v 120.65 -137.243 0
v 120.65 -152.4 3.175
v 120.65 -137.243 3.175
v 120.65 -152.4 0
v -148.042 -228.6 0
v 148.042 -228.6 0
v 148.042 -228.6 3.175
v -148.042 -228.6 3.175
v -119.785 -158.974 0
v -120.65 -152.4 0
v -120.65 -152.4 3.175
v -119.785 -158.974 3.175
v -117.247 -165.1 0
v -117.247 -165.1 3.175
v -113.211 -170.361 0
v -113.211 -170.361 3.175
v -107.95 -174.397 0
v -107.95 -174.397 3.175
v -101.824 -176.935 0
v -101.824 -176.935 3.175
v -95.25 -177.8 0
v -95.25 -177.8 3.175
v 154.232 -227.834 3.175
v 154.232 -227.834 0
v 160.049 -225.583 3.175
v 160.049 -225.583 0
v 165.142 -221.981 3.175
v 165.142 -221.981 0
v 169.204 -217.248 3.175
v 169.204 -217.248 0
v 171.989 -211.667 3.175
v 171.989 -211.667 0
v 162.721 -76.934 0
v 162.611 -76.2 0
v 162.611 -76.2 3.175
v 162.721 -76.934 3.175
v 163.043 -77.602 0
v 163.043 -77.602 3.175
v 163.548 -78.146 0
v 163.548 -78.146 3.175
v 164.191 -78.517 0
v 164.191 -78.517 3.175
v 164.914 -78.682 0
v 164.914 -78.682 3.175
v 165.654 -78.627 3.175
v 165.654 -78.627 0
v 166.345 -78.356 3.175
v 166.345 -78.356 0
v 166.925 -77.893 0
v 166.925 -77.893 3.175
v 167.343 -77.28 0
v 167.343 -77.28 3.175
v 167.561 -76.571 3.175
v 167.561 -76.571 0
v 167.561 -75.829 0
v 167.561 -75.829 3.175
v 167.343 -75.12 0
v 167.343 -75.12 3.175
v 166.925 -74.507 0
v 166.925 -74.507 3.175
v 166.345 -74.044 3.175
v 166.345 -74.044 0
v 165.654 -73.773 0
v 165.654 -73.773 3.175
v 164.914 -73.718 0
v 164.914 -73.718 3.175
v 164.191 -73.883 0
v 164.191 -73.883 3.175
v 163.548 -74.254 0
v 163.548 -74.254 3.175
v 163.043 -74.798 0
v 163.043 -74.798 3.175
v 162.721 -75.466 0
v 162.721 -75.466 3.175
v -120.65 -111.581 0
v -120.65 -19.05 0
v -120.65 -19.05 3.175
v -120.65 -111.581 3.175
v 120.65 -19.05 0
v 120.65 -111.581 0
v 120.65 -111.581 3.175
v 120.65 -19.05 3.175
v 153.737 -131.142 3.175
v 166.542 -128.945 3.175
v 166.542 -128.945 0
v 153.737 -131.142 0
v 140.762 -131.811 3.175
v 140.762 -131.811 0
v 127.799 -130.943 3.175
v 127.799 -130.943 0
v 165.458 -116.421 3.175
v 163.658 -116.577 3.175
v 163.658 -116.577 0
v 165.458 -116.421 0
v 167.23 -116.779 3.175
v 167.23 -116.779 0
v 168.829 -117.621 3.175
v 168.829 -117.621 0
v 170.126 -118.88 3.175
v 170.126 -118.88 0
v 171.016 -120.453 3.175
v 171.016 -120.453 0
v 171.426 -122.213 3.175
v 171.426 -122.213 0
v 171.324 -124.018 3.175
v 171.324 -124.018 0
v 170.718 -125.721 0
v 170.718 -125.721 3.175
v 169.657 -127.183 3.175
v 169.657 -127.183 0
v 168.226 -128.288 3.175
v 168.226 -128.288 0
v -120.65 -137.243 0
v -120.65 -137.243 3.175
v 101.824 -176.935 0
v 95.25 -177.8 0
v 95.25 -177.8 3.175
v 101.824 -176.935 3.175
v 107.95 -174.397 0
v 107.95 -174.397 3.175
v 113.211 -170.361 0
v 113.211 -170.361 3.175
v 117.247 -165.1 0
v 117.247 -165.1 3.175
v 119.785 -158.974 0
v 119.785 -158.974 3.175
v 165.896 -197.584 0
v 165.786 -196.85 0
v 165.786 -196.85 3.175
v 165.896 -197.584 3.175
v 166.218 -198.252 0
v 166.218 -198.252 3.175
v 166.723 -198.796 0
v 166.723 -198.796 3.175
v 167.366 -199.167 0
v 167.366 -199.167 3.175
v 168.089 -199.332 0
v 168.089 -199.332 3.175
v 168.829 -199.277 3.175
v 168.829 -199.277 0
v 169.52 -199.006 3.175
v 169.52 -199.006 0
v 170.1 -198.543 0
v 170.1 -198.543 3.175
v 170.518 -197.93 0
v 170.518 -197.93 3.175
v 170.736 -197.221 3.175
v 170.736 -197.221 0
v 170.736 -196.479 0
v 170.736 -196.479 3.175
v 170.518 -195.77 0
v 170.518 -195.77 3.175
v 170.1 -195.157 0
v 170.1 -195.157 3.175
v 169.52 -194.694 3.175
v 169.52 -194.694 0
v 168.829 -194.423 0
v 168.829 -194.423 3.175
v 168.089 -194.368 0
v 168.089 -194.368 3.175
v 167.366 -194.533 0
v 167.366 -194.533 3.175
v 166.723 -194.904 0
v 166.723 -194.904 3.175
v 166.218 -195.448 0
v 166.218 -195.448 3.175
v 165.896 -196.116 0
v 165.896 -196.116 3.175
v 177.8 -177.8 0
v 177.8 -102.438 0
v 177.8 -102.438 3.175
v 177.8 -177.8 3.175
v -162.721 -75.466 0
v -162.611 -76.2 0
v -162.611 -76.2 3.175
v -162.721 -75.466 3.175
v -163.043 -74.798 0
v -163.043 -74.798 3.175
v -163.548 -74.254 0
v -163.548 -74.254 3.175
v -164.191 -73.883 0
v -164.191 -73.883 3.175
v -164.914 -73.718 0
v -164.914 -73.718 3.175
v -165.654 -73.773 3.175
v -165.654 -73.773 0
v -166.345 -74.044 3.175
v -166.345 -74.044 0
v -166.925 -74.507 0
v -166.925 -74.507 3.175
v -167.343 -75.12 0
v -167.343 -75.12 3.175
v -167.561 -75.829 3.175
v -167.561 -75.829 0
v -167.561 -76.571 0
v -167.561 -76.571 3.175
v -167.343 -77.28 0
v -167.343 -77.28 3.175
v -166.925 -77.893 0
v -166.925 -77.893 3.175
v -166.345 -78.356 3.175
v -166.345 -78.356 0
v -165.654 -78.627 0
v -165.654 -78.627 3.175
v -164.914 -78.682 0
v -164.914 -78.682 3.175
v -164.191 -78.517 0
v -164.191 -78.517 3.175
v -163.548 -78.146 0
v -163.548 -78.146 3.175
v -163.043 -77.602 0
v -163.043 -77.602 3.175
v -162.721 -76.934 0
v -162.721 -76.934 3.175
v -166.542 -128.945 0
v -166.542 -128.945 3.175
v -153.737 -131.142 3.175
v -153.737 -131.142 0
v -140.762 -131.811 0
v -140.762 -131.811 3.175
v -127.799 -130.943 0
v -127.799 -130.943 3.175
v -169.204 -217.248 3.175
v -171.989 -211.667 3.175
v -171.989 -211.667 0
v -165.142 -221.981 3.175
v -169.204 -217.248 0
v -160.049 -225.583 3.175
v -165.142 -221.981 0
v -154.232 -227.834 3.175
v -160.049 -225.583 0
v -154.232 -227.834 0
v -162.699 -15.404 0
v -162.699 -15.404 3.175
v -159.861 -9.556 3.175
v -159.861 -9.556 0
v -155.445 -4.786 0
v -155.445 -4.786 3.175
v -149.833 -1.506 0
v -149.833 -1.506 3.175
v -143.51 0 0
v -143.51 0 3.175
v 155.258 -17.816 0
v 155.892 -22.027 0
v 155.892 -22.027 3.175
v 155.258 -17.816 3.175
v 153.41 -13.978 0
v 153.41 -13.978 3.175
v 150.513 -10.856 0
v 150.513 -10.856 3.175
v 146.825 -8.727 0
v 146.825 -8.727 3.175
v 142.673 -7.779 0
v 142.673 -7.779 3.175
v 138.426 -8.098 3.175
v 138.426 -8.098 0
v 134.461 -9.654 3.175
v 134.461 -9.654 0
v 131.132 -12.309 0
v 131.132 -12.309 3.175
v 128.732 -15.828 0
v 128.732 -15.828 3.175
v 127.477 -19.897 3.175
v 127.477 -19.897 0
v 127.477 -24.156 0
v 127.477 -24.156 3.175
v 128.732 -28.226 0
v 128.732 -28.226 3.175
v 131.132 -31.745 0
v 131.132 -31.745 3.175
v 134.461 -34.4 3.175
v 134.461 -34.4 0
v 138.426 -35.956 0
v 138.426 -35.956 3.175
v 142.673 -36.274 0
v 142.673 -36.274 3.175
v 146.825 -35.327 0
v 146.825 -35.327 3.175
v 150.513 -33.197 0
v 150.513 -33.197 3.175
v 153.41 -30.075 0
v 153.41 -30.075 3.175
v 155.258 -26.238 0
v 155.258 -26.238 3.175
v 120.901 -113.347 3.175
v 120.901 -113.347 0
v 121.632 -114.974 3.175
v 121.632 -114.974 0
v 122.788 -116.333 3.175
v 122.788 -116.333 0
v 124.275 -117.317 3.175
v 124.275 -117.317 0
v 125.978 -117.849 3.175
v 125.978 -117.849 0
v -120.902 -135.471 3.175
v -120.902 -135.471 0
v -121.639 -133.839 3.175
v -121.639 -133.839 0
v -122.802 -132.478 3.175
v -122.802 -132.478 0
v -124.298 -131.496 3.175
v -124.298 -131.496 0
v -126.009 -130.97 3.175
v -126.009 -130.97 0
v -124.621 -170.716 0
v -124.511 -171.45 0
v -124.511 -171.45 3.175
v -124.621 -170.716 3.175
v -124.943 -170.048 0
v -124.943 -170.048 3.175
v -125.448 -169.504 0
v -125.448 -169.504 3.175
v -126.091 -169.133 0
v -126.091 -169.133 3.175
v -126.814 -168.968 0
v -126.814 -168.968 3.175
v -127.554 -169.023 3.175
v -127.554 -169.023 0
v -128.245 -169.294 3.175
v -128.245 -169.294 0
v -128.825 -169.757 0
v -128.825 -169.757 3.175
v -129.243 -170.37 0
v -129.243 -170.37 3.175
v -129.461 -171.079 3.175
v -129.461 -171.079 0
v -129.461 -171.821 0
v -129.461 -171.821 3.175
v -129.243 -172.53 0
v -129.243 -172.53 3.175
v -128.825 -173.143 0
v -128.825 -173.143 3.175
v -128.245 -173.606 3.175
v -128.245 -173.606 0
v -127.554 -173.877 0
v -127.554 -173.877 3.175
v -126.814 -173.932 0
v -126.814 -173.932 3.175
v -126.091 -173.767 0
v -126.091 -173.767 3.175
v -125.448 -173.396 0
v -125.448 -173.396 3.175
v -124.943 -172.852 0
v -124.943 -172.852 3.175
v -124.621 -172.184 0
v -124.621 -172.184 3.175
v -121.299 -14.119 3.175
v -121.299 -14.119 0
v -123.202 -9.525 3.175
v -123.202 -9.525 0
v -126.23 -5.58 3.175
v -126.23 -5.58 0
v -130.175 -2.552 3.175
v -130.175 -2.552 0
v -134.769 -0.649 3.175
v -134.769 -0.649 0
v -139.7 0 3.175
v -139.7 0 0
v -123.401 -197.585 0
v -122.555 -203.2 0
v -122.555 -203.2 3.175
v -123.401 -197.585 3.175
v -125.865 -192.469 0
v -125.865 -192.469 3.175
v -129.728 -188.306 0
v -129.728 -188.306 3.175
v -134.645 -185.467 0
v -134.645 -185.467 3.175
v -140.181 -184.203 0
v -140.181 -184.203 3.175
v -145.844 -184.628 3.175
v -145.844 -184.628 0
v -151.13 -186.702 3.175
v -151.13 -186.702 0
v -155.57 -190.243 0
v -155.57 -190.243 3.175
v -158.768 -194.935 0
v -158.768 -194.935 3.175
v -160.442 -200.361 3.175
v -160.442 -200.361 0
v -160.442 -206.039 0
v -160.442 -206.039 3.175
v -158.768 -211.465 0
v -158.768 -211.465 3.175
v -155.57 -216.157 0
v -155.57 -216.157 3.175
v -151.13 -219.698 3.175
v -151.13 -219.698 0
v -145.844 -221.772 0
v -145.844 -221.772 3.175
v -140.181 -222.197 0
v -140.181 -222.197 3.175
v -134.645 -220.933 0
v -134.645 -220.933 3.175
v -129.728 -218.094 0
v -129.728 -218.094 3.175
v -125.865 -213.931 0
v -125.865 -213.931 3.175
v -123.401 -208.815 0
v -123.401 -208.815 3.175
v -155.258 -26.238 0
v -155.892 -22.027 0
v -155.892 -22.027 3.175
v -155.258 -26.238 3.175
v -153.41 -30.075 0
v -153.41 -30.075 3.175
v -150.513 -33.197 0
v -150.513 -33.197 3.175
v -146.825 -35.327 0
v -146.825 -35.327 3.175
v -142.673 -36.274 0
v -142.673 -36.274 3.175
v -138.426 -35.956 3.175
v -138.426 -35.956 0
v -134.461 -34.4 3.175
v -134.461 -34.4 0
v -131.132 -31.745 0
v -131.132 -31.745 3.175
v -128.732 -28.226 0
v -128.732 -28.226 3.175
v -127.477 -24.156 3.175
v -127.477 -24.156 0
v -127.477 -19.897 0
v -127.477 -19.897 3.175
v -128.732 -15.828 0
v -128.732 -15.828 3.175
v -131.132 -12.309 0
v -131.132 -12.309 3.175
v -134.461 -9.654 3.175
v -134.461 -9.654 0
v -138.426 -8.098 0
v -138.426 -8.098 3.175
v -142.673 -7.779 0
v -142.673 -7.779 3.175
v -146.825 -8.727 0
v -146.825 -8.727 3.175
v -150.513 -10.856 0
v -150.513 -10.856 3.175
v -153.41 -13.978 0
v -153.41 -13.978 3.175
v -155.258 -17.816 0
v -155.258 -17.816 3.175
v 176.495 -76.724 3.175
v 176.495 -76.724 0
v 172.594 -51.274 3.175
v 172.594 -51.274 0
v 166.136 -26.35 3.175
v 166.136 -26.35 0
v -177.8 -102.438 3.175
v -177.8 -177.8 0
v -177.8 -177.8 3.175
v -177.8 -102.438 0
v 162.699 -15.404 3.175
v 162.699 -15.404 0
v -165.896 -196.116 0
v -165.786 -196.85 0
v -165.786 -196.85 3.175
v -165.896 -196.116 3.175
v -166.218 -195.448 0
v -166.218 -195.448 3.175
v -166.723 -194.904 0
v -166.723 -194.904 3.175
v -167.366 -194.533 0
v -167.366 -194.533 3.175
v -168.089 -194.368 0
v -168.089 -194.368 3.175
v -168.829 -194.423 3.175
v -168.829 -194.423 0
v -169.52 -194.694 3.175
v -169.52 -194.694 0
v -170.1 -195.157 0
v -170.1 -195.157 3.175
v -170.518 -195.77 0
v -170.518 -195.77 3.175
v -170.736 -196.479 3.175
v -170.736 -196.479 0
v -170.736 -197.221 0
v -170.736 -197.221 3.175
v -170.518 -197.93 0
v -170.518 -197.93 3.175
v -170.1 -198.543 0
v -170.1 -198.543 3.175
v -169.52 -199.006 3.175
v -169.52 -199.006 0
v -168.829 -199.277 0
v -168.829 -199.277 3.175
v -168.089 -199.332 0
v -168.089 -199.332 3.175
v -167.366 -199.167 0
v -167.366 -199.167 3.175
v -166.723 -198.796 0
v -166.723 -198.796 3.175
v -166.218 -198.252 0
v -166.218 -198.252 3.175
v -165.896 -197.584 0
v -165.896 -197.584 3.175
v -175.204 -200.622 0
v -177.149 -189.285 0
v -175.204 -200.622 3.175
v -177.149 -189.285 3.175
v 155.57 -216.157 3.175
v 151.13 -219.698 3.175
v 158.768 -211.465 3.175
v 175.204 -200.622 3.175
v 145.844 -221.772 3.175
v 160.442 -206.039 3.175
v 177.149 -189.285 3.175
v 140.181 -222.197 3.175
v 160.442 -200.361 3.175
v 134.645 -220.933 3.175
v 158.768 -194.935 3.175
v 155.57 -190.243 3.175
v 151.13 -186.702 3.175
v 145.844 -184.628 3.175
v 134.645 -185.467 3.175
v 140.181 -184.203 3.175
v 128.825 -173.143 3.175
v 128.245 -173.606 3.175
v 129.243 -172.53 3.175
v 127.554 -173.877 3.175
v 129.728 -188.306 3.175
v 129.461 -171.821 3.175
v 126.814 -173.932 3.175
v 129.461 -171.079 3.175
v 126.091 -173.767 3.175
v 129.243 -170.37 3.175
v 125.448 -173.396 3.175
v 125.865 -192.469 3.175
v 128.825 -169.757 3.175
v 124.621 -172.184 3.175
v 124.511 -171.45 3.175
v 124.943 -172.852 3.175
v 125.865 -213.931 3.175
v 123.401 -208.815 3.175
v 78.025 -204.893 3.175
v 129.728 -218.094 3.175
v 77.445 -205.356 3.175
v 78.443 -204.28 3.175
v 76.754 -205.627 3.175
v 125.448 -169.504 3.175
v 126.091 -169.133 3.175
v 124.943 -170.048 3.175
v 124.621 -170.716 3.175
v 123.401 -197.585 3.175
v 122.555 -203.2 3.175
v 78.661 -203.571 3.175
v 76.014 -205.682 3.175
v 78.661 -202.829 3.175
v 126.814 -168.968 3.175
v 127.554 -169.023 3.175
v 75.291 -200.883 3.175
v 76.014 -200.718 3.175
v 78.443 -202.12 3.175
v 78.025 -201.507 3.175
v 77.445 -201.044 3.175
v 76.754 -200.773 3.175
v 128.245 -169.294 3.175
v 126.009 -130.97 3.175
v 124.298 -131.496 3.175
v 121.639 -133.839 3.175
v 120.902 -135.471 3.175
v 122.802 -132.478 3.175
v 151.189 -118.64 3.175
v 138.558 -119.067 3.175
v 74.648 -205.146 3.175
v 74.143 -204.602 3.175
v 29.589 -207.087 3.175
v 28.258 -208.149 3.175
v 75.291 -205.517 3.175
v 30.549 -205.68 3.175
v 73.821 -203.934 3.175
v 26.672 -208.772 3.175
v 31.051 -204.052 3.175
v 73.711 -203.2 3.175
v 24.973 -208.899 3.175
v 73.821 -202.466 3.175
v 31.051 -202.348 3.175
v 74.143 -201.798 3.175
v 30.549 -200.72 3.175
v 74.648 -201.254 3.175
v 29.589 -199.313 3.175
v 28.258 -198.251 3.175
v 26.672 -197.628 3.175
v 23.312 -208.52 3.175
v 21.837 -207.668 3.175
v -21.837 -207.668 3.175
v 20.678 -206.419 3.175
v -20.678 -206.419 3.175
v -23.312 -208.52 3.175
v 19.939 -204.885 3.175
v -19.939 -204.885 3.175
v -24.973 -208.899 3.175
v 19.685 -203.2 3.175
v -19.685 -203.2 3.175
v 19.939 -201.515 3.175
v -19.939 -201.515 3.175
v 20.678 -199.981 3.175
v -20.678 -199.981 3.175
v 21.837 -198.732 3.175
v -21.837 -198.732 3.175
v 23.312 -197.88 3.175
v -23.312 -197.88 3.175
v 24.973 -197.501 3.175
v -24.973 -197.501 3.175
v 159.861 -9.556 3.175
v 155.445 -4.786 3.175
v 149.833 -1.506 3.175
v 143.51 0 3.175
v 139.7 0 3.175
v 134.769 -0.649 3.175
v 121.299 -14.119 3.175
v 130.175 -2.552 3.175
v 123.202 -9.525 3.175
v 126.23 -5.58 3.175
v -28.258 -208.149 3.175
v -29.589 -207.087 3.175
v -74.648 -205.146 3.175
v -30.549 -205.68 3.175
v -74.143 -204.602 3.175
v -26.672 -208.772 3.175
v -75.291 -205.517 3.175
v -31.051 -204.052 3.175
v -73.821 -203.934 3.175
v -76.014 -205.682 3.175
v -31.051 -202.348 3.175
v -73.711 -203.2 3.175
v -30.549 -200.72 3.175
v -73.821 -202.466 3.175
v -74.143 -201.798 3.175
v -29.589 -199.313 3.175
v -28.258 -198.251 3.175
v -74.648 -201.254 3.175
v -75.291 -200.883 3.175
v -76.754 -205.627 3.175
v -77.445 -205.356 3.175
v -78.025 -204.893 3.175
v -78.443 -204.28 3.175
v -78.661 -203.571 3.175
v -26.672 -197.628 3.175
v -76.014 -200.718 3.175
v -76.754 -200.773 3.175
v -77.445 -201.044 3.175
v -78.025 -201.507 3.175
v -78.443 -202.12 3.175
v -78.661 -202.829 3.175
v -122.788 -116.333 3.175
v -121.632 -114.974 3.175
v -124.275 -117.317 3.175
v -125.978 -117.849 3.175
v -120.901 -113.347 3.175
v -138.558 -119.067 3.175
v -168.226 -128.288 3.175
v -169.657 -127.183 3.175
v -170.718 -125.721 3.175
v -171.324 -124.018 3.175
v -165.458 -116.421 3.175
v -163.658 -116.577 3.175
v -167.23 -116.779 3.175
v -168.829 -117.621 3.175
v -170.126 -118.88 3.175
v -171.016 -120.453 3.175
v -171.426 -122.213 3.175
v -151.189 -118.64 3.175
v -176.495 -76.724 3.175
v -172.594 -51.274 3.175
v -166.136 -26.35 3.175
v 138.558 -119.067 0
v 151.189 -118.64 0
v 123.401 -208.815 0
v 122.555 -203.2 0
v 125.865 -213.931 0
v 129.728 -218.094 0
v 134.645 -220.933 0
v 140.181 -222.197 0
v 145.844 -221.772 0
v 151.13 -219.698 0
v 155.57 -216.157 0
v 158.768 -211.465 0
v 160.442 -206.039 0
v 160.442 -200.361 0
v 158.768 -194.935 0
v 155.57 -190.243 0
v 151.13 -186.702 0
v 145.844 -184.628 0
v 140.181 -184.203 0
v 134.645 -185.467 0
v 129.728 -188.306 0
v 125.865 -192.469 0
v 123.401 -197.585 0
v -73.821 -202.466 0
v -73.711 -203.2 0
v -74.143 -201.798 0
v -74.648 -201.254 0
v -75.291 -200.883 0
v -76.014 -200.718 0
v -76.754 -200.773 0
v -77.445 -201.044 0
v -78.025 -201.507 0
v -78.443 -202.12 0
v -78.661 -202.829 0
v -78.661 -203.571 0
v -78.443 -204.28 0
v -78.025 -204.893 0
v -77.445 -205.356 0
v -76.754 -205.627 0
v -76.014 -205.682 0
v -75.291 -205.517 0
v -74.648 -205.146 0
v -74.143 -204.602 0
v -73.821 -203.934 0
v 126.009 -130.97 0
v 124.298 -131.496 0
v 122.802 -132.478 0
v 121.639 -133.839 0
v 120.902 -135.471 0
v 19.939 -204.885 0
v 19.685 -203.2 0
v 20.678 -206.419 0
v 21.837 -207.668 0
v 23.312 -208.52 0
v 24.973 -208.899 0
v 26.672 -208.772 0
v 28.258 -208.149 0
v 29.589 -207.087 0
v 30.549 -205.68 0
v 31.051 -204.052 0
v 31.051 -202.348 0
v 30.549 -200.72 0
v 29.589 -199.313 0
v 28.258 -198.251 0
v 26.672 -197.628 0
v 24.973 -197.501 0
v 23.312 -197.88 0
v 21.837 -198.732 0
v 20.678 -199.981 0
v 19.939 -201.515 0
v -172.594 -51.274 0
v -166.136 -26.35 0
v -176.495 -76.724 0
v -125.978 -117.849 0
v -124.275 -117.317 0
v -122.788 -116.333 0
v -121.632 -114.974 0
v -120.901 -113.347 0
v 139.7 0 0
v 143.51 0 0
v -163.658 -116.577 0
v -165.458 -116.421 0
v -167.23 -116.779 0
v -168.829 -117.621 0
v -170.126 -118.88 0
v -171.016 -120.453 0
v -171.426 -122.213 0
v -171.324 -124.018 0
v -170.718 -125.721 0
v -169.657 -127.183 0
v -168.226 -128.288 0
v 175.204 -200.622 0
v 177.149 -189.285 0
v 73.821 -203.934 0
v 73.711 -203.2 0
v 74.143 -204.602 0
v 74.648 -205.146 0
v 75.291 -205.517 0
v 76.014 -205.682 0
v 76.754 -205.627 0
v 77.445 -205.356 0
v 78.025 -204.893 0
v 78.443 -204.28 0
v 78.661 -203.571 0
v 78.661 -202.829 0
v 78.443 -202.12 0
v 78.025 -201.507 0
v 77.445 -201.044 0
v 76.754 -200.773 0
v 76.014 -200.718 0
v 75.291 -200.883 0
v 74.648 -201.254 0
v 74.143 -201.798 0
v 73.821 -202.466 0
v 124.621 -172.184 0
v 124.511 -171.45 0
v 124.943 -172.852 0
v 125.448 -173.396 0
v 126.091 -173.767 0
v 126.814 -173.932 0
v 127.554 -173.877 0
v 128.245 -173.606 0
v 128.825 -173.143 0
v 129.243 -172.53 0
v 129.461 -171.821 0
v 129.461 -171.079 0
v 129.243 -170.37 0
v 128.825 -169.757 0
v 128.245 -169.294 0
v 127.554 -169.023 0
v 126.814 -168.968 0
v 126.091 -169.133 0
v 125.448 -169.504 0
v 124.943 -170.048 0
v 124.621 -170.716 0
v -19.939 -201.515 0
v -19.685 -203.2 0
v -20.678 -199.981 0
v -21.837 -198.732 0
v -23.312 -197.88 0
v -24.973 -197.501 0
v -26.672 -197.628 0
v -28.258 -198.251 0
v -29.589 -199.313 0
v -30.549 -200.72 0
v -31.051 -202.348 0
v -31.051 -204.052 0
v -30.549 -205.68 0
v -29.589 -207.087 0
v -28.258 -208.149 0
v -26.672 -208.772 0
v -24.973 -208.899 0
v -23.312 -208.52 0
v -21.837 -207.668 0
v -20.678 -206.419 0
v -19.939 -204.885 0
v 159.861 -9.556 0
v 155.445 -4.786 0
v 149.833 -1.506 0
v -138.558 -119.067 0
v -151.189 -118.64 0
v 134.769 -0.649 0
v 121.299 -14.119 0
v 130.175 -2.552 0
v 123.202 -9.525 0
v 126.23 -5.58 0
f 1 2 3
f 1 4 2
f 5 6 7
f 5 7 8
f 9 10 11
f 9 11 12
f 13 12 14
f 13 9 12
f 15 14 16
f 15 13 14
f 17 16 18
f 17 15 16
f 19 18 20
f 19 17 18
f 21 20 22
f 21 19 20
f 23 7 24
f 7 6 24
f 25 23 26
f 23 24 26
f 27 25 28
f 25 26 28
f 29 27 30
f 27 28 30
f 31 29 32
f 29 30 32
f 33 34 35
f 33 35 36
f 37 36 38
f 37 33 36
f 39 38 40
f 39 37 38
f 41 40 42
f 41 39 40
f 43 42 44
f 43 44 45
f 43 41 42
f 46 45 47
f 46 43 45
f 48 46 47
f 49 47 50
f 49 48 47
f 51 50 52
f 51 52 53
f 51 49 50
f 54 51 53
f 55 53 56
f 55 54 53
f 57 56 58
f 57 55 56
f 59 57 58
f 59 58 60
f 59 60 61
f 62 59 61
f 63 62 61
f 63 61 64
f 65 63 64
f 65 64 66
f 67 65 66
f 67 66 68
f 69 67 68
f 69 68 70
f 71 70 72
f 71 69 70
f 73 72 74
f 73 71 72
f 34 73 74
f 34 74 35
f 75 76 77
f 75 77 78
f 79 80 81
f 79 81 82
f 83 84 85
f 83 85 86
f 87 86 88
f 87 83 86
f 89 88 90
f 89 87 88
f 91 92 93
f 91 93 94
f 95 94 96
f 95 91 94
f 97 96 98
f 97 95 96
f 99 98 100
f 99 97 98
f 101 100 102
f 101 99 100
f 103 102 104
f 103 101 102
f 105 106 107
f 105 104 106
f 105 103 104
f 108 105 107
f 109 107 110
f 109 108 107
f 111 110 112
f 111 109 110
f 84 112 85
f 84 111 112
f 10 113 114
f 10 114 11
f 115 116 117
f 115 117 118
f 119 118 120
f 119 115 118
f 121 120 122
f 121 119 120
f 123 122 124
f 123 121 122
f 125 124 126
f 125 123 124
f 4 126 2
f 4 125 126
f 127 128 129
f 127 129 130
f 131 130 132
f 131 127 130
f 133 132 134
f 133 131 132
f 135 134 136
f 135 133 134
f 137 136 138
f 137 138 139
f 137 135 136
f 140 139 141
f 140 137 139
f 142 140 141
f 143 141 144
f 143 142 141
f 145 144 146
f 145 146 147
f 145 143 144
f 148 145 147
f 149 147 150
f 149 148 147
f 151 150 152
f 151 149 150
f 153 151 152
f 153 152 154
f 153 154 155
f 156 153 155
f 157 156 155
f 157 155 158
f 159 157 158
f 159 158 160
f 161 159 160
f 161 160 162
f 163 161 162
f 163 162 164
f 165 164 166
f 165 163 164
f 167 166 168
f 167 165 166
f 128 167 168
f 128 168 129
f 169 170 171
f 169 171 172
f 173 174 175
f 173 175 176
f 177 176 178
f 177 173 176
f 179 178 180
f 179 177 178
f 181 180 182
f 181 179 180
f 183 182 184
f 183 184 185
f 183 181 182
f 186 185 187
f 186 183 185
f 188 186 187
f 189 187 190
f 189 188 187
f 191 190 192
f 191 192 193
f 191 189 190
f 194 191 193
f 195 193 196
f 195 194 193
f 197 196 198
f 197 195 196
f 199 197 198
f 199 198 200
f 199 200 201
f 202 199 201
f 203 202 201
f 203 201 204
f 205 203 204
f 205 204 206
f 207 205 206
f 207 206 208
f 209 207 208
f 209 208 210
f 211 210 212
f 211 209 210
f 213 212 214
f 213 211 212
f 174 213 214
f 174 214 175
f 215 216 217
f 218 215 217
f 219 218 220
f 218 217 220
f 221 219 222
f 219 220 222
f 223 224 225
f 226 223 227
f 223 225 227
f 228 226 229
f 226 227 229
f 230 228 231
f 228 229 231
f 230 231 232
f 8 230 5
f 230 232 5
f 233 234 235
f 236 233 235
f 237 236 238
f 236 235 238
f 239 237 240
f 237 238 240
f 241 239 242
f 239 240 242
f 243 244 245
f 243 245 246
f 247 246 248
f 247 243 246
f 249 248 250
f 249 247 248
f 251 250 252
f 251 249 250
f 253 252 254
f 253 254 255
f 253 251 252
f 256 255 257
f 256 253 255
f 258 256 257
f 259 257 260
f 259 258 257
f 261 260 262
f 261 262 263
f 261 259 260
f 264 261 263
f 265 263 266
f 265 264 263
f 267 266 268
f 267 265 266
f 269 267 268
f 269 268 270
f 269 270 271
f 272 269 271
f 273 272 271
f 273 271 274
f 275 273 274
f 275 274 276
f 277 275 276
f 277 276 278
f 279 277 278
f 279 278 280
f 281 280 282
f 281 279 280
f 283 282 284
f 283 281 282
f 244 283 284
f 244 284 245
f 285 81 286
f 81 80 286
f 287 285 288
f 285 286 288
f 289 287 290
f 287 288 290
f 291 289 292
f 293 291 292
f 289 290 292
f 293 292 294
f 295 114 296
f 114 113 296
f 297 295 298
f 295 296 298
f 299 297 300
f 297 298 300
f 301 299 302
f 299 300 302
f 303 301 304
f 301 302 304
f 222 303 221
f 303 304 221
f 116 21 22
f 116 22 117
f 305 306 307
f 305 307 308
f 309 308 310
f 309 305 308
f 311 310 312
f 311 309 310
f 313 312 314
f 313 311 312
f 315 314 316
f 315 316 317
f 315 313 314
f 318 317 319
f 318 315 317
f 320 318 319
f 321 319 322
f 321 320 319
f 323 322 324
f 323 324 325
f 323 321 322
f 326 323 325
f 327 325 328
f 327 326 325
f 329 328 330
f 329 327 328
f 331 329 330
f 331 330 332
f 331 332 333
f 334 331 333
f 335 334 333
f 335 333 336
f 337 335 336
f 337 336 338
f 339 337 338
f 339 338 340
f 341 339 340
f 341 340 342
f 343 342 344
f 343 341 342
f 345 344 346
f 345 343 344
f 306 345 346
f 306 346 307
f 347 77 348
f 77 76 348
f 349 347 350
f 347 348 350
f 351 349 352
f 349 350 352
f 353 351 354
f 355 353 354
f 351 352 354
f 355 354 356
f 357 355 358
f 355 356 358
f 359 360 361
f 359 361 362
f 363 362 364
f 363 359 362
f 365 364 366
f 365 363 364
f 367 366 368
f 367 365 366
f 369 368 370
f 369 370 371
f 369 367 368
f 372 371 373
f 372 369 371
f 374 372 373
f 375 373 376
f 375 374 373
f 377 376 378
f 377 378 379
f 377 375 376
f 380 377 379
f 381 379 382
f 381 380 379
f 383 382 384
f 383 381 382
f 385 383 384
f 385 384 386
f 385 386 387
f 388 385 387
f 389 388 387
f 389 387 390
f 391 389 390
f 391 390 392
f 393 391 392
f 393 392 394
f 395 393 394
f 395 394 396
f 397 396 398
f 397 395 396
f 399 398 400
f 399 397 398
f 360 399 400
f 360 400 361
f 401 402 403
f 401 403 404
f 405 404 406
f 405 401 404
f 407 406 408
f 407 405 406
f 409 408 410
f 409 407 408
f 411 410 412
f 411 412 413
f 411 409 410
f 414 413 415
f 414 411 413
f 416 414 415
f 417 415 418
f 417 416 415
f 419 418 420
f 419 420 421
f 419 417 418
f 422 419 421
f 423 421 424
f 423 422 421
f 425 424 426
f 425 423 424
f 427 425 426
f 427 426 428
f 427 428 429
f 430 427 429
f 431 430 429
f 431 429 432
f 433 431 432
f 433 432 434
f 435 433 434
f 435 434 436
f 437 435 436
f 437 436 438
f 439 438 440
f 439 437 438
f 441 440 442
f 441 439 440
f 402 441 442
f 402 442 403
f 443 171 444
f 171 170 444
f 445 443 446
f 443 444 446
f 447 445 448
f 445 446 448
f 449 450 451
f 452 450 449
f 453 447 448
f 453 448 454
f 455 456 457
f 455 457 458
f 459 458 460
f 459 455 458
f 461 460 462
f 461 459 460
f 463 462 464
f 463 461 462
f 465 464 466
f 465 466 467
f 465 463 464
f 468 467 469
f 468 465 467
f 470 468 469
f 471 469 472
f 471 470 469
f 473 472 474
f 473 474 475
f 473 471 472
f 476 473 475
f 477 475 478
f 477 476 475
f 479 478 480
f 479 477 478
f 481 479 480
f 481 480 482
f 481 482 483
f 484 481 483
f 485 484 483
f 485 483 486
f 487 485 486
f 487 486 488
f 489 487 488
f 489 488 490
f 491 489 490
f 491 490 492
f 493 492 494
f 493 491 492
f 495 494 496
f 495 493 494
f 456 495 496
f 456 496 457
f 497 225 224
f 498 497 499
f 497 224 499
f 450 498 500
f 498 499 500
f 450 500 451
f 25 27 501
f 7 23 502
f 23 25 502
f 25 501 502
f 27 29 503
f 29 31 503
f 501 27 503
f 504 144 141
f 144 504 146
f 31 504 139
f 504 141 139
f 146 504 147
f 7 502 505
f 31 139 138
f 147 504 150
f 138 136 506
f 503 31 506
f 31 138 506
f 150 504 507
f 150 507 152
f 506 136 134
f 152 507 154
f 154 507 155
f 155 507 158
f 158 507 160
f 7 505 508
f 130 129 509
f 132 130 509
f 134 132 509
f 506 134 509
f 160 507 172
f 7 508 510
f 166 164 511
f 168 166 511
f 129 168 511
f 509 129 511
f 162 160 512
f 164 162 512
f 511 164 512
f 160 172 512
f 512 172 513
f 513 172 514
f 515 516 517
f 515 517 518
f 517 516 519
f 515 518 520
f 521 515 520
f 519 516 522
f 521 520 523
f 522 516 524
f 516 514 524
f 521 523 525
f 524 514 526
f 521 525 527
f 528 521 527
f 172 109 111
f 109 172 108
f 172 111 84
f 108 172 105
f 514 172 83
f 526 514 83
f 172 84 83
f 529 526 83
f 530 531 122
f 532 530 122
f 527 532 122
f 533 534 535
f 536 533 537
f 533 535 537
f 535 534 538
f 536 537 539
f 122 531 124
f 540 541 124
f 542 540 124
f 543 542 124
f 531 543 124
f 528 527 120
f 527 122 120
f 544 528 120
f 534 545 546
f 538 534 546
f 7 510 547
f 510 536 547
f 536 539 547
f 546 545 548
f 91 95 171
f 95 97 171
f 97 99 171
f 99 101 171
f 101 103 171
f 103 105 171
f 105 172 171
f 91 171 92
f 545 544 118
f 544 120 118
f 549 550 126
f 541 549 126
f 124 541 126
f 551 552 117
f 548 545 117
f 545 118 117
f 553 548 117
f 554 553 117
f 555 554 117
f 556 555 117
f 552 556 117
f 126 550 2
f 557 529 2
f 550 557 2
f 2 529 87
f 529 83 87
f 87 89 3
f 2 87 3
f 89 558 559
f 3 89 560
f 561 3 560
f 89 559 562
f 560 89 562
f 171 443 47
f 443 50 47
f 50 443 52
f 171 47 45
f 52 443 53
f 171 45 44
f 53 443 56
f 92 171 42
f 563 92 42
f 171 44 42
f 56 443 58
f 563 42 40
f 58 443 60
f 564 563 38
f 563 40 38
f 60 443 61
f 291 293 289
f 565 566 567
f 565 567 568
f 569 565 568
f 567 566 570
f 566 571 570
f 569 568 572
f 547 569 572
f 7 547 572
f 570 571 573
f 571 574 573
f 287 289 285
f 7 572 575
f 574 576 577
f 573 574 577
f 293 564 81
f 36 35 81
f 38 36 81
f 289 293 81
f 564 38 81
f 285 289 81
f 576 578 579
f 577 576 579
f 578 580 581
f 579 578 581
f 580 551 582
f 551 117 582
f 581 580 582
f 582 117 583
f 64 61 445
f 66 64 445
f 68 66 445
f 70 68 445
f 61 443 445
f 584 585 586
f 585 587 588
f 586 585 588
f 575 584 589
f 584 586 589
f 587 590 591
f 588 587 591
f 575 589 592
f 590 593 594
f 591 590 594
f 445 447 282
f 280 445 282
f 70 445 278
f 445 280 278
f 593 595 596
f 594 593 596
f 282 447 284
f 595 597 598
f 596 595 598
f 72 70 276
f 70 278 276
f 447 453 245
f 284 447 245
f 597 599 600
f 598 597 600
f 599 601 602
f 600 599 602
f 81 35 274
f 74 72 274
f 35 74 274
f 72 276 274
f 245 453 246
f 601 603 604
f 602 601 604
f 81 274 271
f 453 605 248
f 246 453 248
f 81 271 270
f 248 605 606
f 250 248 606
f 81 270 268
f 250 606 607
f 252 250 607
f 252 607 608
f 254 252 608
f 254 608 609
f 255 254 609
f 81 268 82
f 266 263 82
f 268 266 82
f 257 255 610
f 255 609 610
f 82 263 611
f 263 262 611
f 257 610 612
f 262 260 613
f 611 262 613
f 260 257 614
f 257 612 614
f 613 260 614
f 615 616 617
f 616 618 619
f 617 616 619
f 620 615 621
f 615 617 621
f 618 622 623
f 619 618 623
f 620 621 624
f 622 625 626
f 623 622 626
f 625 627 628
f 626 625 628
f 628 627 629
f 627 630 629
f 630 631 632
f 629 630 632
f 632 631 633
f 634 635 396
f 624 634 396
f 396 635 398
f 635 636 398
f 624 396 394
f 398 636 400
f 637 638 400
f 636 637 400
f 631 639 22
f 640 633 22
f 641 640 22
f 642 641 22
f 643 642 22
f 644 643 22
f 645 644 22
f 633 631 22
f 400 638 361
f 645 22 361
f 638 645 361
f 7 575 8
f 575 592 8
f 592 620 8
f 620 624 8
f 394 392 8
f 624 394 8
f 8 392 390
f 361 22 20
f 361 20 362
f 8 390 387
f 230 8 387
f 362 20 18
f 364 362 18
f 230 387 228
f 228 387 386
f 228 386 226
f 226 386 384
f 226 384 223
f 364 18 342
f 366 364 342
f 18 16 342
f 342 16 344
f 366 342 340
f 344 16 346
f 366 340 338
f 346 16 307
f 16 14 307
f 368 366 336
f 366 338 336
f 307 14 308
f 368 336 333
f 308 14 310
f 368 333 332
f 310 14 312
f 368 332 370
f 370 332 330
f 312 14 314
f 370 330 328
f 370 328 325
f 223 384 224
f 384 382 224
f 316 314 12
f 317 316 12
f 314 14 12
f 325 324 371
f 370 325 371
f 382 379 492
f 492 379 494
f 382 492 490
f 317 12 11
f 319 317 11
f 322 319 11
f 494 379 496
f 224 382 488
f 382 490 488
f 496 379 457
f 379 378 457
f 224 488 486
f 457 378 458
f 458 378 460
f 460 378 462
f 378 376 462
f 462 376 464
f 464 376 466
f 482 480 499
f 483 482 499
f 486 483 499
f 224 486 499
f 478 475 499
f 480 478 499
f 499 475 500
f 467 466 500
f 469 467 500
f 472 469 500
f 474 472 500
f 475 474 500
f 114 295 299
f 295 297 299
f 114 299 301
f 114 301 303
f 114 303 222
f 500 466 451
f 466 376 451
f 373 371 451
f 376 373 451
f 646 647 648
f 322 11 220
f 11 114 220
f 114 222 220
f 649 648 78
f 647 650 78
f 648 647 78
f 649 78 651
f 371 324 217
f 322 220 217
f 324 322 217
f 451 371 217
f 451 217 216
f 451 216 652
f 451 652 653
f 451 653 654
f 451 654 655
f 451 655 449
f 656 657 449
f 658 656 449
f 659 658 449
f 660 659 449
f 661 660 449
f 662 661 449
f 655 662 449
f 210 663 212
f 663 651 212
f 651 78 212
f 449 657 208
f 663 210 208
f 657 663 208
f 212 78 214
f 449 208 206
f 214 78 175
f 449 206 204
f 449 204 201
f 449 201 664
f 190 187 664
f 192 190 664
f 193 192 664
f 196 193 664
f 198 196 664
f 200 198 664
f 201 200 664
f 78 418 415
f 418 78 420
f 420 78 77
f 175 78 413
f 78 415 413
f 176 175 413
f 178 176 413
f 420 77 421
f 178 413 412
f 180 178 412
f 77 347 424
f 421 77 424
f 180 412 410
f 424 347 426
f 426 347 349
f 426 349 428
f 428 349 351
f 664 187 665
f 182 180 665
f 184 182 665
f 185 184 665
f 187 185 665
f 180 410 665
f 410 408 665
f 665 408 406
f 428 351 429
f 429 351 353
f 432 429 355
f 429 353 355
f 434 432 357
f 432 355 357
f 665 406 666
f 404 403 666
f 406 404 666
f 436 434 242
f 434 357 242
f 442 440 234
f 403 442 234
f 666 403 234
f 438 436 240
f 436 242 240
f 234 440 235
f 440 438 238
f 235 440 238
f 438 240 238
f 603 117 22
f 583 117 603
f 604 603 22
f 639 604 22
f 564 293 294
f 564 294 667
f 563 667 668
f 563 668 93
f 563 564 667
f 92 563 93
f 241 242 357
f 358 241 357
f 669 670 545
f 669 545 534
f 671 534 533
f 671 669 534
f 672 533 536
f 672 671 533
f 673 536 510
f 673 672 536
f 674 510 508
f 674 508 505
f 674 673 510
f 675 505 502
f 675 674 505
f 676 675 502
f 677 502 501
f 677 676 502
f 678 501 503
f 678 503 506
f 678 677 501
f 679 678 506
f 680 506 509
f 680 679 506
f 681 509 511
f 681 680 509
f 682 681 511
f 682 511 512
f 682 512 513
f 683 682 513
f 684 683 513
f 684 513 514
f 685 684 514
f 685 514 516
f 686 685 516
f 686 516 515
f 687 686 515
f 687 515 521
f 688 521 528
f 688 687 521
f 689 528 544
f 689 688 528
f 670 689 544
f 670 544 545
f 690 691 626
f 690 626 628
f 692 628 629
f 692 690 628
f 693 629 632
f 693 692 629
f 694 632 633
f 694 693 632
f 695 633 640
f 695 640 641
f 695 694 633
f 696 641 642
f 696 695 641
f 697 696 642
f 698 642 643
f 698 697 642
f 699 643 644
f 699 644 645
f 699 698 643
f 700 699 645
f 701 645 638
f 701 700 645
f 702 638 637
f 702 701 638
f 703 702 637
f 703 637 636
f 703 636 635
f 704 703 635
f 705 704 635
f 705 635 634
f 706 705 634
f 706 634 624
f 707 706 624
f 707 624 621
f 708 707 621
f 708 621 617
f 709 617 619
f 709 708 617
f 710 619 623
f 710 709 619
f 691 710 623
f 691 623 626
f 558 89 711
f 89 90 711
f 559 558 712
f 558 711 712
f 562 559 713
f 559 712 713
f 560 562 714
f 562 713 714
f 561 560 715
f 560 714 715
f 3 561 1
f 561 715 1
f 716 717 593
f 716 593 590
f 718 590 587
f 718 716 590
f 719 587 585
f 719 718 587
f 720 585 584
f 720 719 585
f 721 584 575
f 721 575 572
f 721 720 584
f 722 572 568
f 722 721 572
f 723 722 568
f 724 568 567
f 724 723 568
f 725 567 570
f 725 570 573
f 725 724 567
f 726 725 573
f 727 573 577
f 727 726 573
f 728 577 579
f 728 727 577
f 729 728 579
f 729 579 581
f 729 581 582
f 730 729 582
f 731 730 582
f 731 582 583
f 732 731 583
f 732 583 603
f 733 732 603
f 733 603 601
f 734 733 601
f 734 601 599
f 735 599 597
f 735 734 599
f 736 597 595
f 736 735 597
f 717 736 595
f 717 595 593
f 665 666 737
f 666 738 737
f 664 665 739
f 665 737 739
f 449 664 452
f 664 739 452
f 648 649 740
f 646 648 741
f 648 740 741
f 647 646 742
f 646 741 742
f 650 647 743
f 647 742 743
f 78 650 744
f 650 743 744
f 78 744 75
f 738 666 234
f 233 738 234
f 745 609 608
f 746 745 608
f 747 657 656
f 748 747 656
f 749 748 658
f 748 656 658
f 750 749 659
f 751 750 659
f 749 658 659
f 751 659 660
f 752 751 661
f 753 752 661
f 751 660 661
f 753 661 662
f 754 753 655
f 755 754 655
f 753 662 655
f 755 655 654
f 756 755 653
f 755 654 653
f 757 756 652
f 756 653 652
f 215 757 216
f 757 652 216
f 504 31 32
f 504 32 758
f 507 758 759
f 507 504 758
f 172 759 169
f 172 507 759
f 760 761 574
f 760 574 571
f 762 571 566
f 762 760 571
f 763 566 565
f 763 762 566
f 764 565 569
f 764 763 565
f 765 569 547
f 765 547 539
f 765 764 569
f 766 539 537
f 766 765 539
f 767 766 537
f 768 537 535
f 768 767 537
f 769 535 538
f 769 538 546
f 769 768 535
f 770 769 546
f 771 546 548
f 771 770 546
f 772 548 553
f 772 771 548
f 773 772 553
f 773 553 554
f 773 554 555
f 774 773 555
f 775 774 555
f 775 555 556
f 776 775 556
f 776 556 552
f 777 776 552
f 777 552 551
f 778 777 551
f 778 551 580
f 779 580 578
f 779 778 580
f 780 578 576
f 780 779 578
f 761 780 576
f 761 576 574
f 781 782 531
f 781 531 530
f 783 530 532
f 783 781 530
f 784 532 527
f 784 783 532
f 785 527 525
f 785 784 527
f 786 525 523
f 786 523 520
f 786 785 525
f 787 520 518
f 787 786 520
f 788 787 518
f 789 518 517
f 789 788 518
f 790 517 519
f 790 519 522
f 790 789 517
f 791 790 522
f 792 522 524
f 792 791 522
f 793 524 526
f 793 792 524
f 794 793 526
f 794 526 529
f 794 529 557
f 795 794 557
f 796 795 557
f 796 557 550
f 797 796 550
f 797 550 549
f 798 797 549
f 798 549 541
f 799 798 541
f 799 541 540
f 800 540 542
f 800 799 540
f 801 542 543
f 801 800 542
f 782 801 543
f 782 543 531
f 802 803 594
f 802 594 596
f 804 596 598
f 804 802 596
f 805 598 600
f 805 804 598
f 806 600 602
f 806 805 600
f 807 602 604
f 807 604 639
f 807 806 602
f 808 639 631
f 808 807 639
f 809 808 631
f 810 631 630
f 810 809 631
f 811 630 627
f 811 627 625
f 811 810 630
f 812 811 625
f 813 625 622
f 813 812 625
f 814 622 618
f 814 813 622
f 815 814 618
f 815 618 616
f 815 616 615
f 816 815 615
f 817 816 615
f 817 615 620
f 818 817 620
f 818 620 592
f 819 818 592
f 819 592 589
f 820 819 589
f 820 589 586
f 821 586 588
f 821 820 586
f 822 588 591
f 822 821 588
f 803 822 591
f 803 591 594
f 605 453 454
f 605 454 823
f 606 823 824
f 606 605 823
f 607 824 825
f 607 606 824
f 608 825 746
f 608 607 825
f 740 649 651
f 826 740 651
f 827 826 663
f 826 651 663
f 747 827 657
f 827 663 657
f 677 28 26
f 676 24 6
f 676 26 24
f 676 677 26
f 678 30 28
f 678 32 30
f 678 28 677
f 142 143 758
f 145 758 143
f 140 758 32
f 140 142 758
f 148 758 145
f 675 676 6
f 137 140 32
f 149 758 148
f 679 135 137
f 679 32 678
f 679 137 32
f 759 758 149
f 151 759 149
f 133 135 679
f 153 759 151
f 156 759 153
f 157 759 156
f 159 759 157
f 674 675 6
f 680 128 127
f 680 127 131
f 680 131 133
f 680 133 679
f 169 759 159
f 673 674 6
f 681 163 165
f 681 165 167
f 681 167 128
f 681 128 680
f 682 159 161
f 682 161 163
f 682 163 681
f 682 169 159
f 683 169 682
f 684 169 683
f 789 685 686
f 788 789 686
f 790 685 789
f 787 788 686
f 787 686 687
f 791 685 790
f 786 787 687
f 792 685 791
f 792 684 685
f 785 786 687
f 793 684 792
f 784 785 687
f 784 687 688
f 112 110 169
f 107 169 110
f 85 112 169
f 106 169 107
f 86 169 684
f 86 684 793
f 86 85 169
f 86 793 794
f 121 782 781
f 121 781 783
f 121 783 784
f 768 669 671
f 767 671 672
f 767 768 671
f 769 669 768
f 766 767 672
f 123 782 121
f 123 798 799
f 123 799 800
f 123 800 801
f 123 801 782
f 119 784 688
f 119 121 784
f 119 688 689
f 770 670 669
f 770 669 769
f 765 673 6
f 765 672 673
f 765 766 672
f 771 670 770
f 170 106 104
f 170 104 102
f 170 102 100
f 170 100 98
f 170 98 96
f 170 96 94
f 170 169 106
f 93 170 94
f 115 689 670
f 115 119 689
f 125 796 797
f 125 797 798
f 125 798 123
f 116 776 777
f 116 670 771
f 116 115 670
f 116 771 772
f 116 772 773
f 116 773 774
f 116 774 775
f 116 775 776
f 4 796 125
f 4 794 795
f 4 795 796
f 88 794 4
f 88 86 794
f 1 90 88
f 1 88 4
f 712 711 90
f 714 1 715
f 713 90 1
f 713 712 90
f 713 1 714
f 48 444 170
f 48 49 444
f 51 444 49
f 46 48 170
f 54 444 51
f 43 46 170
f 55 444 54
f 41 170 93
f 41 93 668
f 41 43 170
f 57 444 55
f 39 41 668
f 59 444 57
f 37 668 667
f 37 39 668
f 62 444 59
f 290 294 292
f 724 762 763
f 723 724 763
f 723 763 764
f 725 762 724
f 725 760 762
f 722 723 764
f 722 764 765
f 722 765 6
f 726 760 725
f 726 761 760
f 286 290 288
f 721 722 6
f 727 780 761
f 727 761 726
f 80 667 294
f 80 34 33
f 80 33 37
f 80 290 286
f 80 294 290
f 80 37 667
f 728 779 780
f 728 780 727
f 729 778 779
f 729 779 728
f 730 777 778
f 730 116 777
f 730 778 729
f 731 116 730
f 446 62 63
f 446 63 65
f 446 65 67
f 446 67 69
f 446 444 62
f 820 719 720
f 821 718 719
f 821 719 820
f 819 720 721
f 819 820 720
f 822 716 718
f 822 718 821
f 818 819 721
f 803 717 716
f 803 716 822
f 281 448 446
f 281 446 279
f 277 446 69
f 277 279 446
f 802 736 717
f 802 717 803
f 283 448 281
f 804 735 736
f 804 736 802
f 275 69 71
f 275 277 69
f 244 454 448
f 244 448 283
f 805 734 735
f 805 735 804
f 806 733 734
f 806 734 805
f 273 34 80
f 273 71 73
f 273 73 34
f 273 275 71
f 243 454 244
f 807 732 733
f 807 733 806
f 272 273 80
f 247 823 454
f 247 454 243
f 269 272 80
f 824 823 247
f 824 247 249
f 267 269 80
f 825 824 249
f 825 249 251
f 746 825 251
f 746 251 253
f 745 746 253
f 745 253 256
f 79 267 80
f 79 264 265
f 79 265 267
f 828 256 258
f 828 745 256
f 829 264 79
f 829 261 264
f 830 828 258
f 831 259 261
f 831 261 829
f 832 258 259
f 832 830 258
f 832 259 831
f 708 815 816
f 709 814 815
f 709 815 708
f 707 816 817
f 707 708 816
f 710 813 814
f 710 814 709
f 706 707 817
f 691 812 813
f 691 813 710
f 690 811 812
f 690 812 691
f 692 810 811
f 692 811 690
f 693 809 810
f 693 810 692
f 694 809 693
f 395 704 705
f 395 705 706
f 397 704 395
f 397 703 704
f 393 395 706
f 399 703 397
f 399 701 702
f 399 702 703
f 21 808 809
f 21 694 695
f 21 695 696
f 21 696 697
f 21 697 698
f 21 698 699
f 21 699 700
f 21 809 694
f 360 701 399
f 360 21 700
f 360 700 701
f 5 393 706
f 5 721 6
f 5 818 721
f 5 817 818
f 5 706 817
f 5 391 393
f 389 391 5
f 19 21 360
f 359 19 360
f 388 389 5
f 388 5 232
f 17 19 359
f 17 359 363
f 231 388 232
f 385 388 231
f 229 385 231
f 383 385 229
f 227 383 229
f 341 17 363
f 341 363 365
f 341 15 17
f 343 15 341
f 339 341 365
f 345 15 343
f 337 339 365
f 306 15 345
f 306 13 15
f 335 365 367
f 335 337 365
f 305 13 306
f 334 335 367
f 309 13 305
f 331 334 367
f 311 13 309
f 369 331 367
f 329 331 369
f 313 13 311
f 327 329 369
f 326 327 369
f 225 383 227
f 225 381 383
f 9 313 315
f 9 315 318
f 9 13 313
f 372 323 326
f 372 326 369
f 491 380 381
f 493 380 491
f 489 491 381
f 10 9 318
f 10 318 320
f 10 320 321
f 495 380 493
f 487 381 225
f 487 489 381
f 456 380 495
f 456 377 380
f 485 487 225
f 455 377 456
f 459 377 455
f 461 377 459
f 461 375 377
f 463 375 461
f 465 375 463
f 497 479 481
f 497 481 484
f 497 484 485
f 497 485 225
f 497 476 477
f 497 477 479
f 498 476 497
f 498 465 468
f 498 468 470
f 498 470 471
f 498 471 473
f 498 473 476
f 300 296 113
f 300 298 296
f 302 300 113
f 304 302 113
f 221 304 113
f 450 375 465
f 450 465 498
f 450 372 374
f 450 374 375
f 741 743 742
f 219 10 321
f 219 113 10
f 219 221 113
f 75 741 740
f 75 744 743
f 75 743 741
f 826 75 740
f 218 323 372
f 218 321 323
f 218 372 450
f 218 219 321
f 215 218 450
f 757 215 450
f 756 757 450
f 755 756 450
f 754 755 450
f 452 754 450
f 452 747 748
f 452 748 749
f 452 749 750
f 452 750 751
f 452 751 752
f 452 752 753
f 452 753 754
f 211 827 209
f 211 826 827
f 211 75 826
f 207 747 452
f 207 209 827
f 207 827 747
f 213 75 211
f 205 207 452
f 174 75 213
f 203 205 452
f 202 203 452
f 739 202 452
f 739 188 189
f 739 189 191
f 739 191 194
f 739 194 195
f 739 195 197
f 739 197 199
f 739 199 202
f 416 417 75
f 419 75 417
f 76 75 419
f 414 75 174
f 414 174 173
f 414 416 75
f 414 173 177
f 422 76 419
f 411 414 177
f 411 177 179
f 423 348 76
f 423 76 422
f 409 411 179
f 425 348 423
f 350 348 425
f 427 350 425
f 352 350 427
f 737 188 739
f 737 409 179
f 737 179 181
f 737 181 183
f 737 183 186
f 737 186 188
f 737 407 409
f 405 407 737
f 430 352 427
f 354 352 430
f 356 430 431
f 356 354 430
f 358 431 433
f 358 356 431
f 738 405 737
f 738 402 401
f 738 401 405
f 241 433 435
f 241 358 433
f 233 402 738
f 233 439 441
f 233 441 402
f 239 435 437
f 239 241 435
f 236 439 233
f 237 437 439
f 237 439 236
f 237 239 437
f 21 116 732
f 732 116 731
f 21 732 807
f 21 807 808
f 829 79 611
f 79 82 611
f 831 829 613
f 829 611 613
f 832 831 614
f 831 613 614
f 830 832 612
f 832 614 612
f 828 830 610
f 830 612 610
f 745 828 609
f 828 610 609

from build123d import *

# Parameters (mm, degrees)
SKETCH1_R           = 14.2875
SKETCH1_R_2         = 19.05
SKETCH1_R_3         = 2.4892
SKETCH1_R_4         = 5.715
BOSS_EXTRUDE3_DEPTH = 3.175
SKETCH2_W           = 355.6
SKETCH2_H           = 19.05
CUT_EXTRUDE1_DEPTH  = 290.621961572
FILLET1_R           = 19.05
CUT_EXTRUDE2_DEPTH  = 290.621961572
FILLET2_R           = 254
CUT_EXTRUDE3_DEPTH  = 290.621961572
FILLET3_R           = 25.4
CUT_EXTRUDE4_DEPTH  = 290.621961572
FILLET4_R           = 6.35


with BuildPart() as part:
    # Sketch1 → Boss-Extrude3 (new body)
    with BuildSketch(Plane.XY):
        with BuildLine():
            Line((120.65, -152.4), (120.65, -6.35))
            Line((120.65, -6.35), (120.65, 6.35))
            ThreePointArc((120.65, 6.35), (124.369743879, 15.330256121), (133.35, 19.05))
            Line((133.35, 19.05), (165.1, 19.05))
            ThreePointArc((165.1, 19.05), (174.080256121, 15.330256121), (177.8, 6.35))
            Line((177.8, 6.35), (177.8, -6.35))
            Line((177.8, -6.35), (177.8, -222.25))
            ThreePointArc((177.8, -222.25), (175.940128061, -226.740128061), (171.45, -228.6))
            Line((171.45, -228.6), (12.7, -228.6))
            Line((12.7, -228.6), (-12.7, -228.6))
            Line((-12.7, -228.6), (-171.45, -228.6))
            ThreePointArc((-171.45, -228.6), (-175.940128061, -226.740128061), (-177.8, -222.25))
            Line((-177.8, -222.25), (-177.8, -6.35))
            Line((-177.8, -6.35), (-177.8, 6.35))
            ThreePointArc((-177.8, 6.35), (-174.080256121, 15.330256121), (-165.1, 19.05))
            Line((-165.1, 19.05), (-133.35, 19.05))
            ThreePointArc((-133.35, 19.05), (-124.369743879, 15.330256121), (-120.65, 6.35))
            Line((-120.65, 6.35), (-120.65, -6.35))
            Line((-120.65, -6.35), (-120.65, -152.4))
            ThreePointArc((-120.65, -152.4), (-113.210512242, -170.360512242), (-95.25, -177.8))
            Line((-95.25, -177.8), (-12.7, -177.8))
            Line((-12.7, -177.8), (12.7, -177.8))
            Line((12.7, -177.8), (95.25, -177.8))
            ThreePointArc((95.25, -177.8), (113.210512242, -170.360512242), (120.65, -152.4))
        make_face()
        with Locations((141.605, -22.02688)):
            Circle(SKETCH1_R, mode=Mode.SUBTRACT)
        with Locations(Location((-141.605, -22.02688, 0), (0, 0, 180))):
            Circle(SKETCH1_R, mode=Mode.SUBTRACT)
        with Locations((-141.605, -203.2)):
            Circle(SKETCH1_R_2, mode=Mode.SUBTRACT)
        with Locations(Location((141.605, -203.2, 0), (0, 0, 180))):
            Circle(SKETCH1_R_2, mode=Mode.SUBTRACT)
        with Locations((-76.2, -203.2)):
            Circle(SKETCH1_R_3, mode=Mode.SUBTRACT)
        with Locations(Location((76.2, -203.2, 0), (0, 0, 180))):
            Circle(SKETCH1_R_3, mode=Mode.SUBTRACT)
        with Locations((-25.4, -203.2)):
            Circle(SKETCH1_R_4, mode=Mode.SUBTRACT)
        with Locations((-149.225, 6.35)):
            Circle(SKETCH1_R_3, mode=Mode.SUBTRACT)
        with Locations(Location((149.225, 6.35, 0), (0, 0, 180))):
            Circle(SKETCH1_R_3, mode=Mode.SUBTRACT)
        with Locations((-168.275, -196.85)):
            Circle(SKETCH1_R_3, mode=Mode.SUBTRACT)
        with Locations(Location((168.275, -196.85, 0), (0, 0, 180))):
            Circle(SKETCH1_R_3, mode=Mode.SUBTRACT)
        with Locations((-165.1, -76.2)):
            Circle(SKETCH1_R_3, mode=Mode.SUBTRACT)
        with Locations(Location((165.1, -76.2, 0), (0, 0, 180))):
            Circle(SKETCH1_R_3, mode=Mode.SUBTRACT)
        with Locations((-127, -171.45)):
            Circle(SKETCH1_R_3, mode=Mode.SUBTRACT)
        with Locations(Location((127, -171.45, 0), (0, 0, 180))):
            Circle(SKETCH1_R_3, mode=Mode.SUBTRACT)
        with Locations(Location((25.4, -203.2, 0), (0, 0, 180))):
            Circle(SKETCH1_R_4, mode=Mode.SUBTRACT)
    extrude(amount=BOSS_EXTRUDE3_DEPTH)

    # Sketch2 → Cut-Extrude1 (cut, through all)
    with BuildSketch(Plane.XY.offset(3.175)):
        with Locations((0, 9.525)):
            Rectangle(SKETCH2_W, SKETCH2_H)
    extrude(amount=-CUT_EXTRUDE1_DEPTH, mode=Mode.SUBTRACT)

    # Fillet1
    fillet1_edges = [part.edges().sort_by_distance(p)[0] for p in [
        (-177.8, 0, 1.5875),
        (120.65, 0, 1.5875),
        (177.8, 0, 1.5875),
        (-120.65, 0, 1.5875),
    ]]
    fillet(fillet1_edges, radius=FILLET1_R)

    # Sketch3 → Cut-Extrude2 (cut, through all)
    with BuildSketch(Plane.XY.offset(3.175)):
        with BuildLine():
            Line((-177.8, 0), (-177.8, -63.5))
            Line((-177.8, -63.5), (-162.698792053, -15.403859213))
            ThreePointArc((-162.698792053, -15.403859213), (-155.445369527, -4.785747819), (-143.51, 0))
            Line((-143.51, 0), (-177.8, 0))
        make_face()
    cut_extrude2 = extrude(amount=-CUT_EXTRUDE2_DEPTH, mode=Mode.SUBTRACT)

    # Mirror1: Cut-Extrude2 across plane
    add(cut_extrude2.mirror(Plane.ZY), mode=Mode.SUBTRACT)

    # Fillet2
    fillet2_edges = [part.edges().sort_by_distance(p)[0] for p in [
        (-177.8, -63.5, 1.5875),
        (177.8, -63.5, 1.5875),
    ]]
    fillet(fillet2_edges, radius=FILLET2_R)

    # Sketch4 → Cut-Extrude3 (cut, through all)
    with BuildSketch(Plane.XY.offset(3.175)):
        with BuildLine():
            Line((-177.8, -177.8), (-177.8, -228.6))
            Line((-177.8, -228.6), (-164.188181024, -228.6))
            ThreePointArc((-164.188181024, -228.6), (-174.338063951, -204.096014982), (-177.8, -177.8))
        make_face()
        with BuildLine():
            Line((177.8, -177.8), (177.8, -228.6))
            Line((177.8, -228.6), (164.188181024, -228.6))
            ThreePointArc((164.188181024, -228.6), (174.338063951, -204.096014982), (177.8, -177.8))
        make_face()
    extrude(amount=-CUT_EXTRUDE3_DEPTH, mode=Mode.SUBTRACT)

    # Fillet3
    fillet3_edges = [part.edges().sort_by_distance(p)[0] for p in [
        (-164.188181024, -228.6, 1.5875),
        (164.188181024, -228.6, 1.5875),
    ]]
    fillet(fillet3_edges, radius=FILLET3_R)

    # Sketch5 → Cut-Extrude4 (cut, through all)
    with BuildSketch(Plane.XY.offset(3.175)):
        with BuildLine():
            Line((-120.65, -129.796193121), (-120.65, -116.826181287))
            ThreePointArc((-120.65, -116.826181287), (-142.167804376, -119.112938735), (-163.657650988, -116.576867488))
            ThreePointArc((-163.657650988, -116.576867488), (-171.284022099, -121.318540575), (-166.542349012, -128.944911687))
            ThreePointArc((-166.542349012, -128.944911687), (-143.641159604, -131.795686724), (-120.65, -129.796193121))
        make_face()
        with BuildLine():
            Line((120.65, -129.796193121), (120.65, -116.826181287))
            ThreePointArc((120.65, -116.826181287), (142.167804376, -119.112938735), (163.657650988, -116.576867488))
            ThreePointArc((163.657650988, -116.576867488), (171.284022099, -121.318540575), (166.542349012, -128.944911687))
            ThreePointArc((166.542349012, -128.944911687), (143.641159604, -131.795686724), (120.65, -129.796193121))
        make_face()
    extrude(amount=-CUT_EXTRUDE4_DEPTH, mode=Mode.SUBTRACT)

    # Fillet4
    fillet4_edges = [part.edges().sort_by_distance(p)[0] for p in [
        (-120.65, -116.826181287, 1.5875),
        (-120.65, -129.796193121, 1.5875),
        (120.65, -129.796193121, 1.5875),
        (120.65, -116.826181287, 1.5875),
    ]]
    fillet(fillet4_edges, radius=FILLET4_R)


solid = part.part
